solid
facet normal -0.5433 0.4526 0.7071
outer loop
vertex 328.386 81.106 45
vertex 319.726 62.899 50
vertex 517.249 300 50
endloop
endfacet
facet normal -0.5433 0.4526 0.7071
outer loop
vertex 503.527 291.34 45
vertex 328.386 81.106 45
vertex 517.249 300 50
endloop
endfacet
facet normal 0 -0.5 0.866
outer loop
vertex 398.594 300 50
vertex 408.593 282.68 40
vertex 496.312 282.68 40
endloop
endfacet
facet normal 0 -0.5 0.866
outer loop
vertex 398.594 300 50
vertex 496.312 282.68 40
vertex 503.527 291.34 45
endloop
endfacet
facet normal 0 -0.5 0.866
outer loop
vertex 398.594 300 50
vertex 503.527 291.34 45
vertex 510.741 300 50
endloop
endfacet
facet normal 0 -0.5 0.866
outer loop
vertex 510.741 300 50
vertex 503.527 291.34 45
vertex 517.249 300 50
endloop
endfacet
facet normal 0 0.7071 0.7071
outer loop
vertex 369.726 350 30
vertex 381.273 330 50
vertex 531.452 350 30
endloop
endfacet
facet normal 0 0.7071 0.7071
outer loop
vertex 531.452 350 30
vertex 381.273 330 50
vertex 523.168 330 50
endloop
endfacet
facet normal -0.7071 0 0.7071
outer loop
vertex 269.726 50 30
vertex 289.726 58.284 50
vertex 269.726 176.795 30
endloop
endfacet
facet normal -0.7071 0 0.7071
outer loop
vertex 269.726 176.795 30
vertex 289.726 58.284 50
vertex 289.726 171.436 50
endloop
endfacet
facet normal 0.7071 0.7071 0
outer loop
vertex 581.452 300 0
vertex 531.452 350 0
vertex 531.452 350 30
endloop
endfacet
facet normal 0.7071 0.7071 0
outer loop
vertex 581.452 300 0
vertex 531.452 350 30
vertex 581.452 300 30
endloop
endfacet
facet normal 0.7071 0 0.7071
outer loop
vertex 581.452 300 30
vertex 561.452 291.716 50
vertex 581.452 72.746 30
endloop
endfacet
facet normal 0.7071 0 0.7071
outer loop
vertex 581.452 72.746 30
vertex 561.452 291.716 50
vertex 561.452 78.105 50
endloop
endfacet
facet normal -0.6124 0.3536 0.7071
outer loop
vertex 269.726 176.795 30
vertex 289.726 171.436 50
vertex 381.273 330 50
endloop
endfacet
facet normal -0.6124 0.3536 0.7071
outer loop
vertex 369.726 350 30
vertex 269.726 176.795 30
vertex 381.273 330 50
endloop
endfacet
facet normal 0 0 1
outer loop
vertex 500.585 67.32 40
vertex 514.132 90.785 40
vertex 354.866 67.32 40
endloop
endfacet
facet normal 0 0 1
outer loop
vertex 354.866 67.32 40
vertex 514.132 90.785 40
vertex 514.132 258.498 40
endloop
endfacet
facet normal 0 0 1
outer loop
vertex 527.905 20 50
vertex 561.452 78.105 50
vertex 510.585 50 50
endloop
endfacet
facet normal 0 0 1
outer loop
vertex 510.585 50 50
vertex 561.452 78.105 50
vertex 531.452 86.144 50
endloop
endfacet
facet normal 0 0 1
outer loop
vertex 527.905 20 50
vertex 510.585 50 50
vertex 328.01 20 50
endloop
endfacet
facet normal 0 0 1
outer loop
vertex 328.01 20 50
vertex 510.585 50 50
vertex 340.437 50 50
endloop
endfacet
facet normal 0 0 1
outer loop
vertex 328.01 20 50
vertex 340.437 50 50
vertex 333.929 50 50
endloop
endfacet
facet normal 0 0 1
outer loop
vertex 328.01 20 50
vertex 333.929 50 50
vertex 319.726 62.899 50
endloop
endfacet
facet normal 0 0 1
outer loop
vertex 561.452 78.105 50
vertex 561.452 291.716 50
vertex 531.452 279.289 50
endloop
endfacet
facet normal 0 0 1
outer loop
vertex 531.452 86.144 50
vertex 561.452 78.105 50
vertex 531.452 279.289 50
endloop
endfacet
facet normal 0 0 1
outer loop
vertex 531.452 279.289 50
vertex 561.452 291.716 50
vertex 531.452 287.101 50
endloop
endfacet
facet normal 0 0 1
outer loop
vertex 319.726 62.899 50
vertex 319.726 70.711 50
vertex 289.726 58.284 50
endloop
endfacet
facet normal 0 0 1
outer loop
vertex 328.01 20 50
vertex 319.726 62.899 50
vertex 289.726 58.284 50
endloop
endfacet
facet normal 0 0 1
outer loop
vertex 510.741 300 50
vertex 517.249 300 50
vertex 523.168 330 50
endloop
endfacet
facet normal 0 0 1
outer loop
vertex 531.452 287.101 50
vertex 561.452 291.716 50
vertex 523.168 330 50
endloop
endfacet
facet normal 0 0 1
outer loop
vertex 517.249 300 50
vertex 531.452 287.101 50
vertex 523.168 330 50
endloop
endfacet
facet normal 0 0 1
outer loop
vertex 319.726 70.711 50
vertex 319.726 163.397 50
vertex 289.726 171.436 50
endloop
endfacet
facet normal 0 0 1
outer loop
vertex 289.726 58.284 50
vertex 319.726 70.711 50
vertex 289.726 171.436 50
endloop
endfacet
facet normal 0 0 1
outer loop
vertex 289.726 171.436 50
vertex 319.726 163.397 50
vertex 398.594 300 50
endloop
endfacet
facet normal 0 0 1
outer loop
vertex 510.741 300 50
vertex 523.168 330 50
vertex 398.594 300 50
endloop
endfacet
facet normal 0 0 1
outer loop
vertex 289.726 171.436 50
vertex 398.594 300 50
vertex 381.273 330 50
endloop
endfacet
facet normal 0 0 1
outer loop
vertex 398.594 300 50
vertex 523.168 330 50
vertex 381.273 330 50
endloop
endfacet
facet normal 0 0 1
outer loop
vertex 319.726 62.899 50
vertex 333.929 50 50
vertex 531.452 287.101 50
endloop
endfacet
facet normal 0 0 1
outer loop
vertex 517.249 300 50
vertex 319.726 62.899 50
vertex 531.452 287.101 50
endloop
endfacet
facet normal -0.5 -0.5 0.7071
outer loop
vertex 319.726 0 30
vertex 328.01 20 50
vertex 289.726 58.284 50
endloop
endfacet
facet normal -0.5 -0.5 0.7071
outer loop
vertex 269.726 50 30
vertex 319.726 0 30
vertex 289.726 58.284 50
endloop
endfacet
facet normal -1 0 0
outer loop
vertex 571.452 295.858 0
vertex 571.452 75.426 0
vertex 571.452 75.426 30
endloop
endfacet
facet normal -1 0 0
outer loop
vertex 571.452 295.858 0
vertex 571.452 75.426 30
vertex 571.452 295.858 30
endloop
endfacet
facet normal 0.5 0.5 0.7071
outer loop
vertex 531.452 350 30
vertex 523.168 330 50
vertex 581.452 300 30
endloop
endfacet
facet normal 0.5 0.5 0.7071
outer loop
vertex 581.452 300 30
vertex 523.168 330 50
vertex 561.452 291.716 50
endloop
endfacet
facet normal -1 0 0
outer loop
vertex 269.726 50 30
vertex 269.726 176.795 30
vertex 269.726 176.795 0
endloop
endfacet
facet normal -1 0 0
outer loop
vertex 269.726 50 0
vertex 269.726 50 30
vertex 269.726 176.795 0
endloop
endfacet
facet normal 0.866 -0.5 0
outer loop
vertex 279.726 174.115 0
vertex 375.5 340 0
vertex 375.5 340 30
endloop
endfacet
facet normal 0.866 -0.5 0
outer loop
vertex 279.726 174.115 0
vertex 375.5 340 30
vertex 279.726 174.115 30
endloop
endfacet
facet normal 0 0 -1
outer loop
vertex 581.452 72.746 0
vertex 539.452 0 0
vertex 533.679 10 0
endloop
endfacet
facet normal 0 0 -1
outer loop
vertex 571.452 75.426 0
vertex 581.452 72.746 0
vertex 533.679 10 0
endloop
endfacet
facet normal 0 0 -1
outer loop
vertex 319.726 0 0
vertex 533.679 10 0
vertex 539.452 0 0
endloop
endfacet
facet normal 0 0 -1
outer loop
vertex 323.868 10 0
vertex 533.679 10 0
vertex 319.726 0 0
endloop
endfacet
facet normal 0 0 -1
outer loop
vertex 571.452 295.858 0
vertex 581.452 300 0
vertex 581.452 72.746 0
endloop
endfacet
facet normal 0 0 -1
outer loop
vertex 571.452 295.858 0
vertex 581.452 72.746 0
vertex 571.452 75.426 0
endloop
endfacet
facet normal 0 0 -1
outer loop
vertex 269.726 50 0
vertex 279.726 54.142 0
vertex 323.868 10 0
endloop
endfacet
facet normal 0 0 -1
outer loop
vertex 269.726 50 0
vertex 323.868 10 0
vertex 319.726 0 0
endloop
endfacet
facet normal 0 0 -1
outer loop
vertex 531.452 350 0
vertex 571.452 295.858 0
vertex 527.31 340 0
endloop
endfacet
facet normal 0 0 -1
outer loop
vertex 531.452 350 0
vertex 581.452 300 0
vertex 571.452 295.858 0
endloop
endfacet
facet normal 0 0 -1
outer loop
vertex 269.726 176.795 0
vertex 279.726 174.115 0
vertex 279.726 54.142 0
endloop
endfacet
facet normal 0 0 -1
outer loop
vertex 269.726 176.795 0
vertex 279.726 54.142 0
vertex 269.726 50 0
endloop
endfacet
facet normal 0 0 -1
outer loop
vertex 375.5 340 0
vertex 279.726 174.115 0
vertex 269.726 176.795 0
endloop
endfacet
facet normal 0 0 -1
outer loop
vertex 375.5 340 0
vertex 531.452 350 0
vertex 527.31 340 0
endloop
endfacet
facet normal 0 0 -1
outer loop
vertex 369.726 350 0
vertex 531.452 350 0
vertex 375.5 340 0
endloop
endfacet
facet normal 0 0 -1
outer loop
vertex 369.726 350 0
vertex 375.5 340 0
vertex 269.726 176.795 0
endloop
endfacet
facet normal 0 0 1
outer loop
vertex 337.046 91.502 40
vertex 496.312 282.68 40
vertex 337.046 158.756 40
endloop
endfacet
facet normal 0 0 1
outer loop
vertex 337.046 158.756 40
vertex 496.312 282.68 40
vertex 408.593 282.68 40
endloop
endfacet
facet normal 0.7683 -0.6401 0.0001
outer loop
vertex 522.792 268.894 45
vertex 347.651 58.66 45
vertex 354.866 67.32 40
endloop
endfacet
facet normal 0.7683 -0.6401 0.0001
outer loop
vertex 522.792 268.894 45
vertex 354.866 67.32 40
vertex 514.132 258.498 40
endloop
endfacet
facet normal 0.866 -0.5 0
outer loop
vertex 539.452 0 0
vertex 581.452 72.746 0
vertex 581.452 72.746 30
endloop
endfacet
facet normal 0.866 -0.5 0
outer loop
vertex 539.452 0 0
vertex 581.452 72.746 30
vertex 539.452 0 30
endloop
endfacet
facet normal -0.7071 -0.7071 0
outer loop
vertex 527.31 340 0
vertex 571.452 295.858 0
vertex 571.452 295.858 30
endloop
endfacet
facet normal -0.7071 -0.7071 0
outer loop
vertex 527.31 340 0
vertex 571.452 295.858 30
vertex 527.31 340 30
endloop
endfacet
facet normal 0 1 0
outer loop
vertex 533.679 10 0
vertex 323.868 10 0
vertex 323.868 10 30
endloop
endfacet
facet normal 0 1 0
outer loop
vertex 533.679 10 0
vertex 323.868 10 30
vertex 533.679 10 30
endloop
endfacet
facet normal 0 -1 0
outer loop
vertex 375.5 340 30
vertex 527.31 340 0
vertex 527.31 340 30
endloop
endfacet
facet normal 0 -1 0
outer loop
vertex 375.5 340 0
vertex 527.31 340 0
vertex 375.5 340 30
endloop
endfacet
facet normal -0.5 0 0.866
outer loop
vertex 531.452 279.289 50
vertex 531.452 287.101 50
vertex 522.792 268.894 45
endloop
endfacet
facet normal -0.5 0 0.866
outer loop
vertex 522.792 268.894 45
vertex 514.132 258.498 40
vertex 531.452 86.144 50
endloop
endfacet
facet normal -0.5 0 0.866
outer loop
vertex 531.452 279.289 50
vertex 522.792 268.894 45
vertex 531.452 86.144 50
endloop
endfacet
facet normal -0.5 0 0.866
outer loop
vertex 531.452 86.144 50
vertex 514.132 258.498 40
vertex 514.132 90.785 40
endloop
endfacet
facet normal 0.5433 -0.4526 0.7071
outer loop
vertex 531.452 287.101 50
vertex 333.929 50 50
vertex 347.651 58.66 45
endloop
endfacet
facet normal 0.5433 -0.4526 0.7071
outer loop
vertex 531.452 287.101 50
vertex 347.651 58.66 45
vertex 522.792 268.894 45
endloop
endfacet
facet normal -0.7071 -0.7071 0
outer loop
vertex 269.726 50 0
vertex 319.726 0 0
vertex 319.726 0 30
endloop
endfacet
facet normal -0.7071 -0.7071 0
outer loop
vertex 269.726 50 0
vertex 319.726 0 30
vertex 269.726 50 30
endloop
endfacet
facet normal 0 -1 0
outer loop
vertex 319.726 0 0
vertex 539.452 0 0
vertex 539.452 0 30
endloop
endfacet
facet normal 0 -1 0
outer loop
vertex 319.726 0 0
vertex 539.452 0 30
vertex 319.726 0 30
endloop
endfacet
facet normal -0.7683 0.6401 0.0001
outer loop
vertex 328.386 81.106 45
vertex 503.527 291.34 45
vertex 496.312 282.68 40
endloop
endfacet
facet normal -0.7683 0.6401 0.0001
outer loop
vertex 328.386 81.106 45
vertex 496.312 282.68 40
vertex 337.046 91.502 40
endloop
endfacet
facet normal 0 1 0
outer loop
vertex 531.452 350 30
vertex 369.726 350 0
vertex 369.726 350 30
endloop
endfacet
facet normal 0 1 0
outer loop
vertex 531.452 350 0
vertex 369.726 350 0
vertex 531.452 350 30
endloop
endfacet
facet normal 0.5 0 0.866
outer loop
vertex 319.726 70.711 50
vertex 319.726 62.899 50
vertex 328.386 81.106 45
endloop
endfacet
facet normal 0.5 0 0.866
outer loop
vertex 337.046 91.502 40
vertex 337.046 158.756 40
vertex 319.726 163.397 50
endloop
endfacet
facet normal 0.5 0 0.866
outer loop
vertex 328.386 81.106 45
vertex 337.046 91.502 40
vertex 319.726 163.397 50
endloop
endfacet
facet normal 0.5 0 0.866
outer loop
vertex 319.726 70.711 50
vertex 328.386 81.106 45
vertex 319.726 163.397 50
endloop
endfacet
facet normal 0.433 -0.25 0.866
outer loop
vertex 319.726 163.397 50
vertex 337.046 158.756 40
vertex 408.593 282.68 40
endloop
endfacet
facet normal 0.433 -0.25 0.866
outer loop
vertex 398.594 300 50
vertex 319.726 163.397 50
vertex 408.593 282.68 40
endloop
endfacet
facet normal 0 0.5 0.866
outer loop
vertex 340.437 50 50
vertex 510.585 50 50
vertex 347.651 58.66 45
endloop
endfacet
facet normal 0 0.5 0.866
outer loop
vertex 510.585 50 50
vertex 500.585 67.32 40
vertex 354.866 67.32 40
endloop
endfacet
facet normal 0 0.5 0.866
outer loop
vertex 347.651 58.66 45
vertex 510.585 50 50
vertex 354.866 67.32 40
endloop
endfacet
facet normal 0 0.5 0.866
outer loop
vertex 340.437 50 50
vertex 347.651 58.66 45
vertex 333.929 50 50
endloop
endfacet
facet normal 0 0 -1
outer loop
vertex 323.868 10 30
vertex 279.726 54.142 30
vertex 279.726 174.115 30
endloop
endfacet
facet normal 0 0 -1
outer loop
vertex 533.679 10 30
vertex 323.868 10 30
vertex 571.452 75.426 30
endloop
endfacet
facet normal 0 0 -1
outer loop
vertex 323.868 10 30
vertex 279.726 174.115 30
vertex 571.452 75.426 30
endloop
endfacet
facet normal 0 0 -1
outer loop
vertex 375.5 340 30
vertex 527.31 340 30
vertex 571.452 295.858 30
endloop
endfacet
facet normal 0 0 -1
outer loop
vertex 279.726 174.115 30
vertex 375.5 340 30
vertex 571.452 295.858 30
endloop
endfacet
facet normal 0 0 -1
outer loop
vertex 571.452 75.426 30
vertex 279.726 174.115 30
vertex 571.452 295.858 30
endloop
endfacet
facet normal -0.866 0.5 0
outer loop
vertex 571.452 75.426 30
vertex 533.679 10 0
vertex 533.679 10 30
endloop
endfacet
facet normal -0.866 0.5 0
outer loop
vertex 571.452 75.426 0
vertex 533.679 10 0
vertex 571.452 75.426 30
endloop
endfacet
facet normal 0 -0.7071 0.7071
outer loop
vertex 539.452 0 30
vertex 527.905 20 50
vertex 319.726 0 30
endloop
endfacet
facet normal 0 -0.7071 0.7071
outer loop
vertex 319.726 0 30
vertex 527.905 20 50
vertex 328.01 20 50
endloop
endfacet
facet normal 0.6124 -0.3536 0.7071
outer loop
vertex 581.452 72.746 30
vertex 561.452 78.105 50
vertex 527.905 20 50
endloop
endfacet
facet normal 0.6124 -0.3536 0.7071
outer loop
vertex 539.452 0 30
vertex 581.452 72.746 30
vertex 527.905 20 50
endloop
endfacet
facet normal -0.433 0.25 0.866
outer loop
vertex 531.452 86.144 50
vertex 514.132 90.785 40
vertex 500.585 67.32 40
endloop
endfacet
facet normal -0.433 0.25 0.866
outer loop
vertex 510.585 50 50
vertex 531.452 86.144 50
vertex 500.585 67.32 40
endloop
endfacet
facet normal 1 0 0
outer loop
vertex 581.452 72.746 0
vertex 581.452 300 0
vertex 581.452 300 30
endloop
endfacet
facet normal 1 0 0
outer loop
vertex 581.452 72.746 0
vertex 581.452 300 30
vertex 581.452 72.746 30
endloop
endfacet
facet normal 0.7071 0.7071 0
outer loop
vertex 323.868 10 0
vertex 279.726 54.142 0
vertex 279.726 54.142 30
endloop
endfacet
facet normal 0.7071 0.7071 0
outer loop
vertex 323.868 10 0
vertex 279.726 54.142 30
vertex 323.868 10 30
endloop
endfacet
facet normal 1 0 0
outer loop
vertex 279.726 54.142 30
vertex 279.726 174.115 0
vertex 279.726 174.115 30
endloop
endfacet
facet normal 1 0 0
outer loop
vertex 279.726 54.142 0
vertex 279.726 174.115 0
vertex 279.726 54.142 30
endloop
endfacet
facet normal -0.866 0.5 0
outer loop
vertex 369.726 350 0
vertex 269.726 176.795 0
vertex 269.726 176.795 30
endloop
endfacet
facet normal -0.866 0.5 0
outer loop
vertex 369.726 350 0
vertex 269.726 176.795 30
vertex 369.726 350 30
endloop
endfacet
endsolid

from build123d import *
from OCP.BRepFilletAPI import BRepFilletAPI_MakeChamfer

# Parameters (mm, degrees)
BOSS_EXTRU_1_DEPTH      = 50
CHANFREIN1_SIZE         = 20
ENL_V_MAT_EXTRU_1_DEPTH = 10
CHANFREIN2_SIZE         = 10
CHANFREIN2_SIZE_2       = 17.320508076
CHANFREIN3_SIZE         = 5
ENL_V_MAT_EXTRU_2_DEPTH = 30
ESQUISSE4_W             = 311.726027397
ESQUISSE4_H             = 51.931996983
ENL_V_MAT_EXTRU_3_DEPTH = 681.504586336


# Some blends are built 0.0001 mm under size
with BuildPart() as part:
    # Esquisse1 → Boss.-Extru.1 (new body)
    with BuildSketch(Plane.XY):
        Polygon((0, 0), (219.726027397, 0), (269.726027397, 50), (269.726027397, 176.794919243), (169.726027397, 350), (8, 350), (-42, 300), (-42, 72.746133918), align=None)
    extrude(amount=BOSS_EXTRU_1_DEPTH)

    # Chanfrein1
    chanfrein1_edges = [part.edges().sort_by_distance(p)[0] for p in [
        (244.726027397, 25, 50),
        (269.726027397, 113.397459622, 50),
        (219.726027397, 263.397459622, 50),
        (88.863013699, 350, 50),
        (-17, 325, 50),
        (-42, 186.373066959, 50),
        (-21, 36.373066959, 50),
        (109.863013699, 0, 50),
    ]]
    chamfer(chanfrein1_edges, length=CHANFREIN1_SIZE)

    # Esquisse2 → Enlèv. mat.-Extru.1 (cut)
    with BuildSketch(Plane.XY.offset(50)):
        Polygon((28.710678119, 300), (219.726027397, 70.710678119), (219.726027397, 163.397459622), (140.858513938, 300), align=None)
        Polygon((199.015349279, 50), (8, 279.289321881), (8, 86.143593539), (28.867513459, 50), align=None)
    extrude(amount=-ENL_V_MAT_EXTRU_1_DEPTH, mode=Mode.SUBTRACT)

    # Chanfrein2
    chanfrein2_edges_1 = [part.edges().sort_by_distance(p)[0] for p in [
        (219.726027397, 117.05406887, 40),
    ]]
    chanfrein2_side_1 = [part.faces().sort_by_distance(p)[0] for p in [
        (219.726027397, 117.05406887, 40.2),
    ]]
    chanfrein2_edges_2 = [part.edges().sort_by_distance(p)[0] for p in [
        (180.292270668, 231.698729811, 40),
    ]]
    chanfrein2_side_2 = [part.faces().sort_by_distance(p)[0] for p in [
        (180.292270668, 231.698729811, 40.2),
    ]]
    chanfrein2_edges_3 = [part.edges().sort_by_distance(p)[0] for p in [
        (84.784596028, 300, 40),
    ]]
    chanfrein2_side_3 = [part.faces().sort_by_distance(p)[0] for p in [
        (84.784596028, 300, 40.2),
    ]]
    chanfrein2_edges_4 = [part.edges().sort_by_distance(p)[0] for p in [
        (113.941431369, 50, 40),
    ]]
    chanfrein2_side_4 = [part.faces().sort_by_distance(p)[0] for p in [
        (113.941431369, 50, 40.2),
    ]]
    chanfrein2_edges_5 = [part.edges().sort_by_distance(p)[0] for p in [
        (18.43375673, 68.07179677, 40),
    ]]
    chanfrein2_side_5 = [part.faces().sort_by_distance(p)[0] for p in [
        (18.43375673, 68.07179677, 40.2),
    ]]
    chanfrein2_edges_6 = [part.edges().sort_by_distance(p)[0] for p in [
        (8, 182.71645771, 40),
    ]]
    chanfrein2_side_6 = [part.faces().sort_by_distance(p)[0] for p in [
        (8, 182.71645771, 40.2),
    ]]
    chanfrein2 = BRepFilletAPI_MakeChamfer(part.part.solid().wrapped)
    for e in chanfrein2_edges_1:
        chanfrein2.Add(CHANFREIN2_SIZE - 0.0001, CHANFREIN2_SIZE_2 - 0.0001, e.wrapped, chanfrein2_side_1[0].wrapped)
    for e in chanfrein2_edges_2:
        chanfrein2.Add(CHANFREIN2_SIZE - 0.0001, CHANFREIN2_SIZE_2 - 0.0001, e.wrapped, chanfrein2_side_2[0].wrapped)
    for e in chanfrein2_edges_3:
        chanfrein2.Add(CHANFREIN2_SIZE - 0.0001, CHANFREIN2_SIZE_2 - 0.0001, e.wrapped, chanfrein2_side_3[0].wrapped)
    for e in chanfrein2_edges_4:
        chanfrein2.Add(CHANFREIN2_SIZE - 0.0001, CHANFREIN2_SIZE_2 - 0.0001, e.wrapped, chanfrein2_side_4[0].wrapped)
    for e in chanfrein2_edges_5:
        chanfrein2.Add(CHANFREIN2_SIZE - 0.0001, CHANFREIN2_SIZE_2 - 0.0001, e.wrapped, chanfrein2_side_5[0].wrapped)
    for e in chanfrein2_edges_6:
        chanfrein2.Add(CHANFREIN2_SIZE - 0.0001, CHANFREIN2_SIZE_2 - 0.0001, e.wrapped, chanfrein2_side_6[0].wrapped)
    add(Compound.cast(chanfrein2.Shape()), mode=Mode.REPLACE)  # a hair under: the kernel refuses the full size

    # Chanfrein3
    # the kernel refuses this chamfer: 5 mm, written as the material it takes off along each edge
    with BuildSketch(Plane(origin=(20.480424013, 309.879359904, 50), x_dir=(-0.768028153682994, -0.6398255480361086, 0.02749587661058626), z_dir=(0.6400675467511631, -0.7683186419682577, 0))) as chanfrein3_piece_1_section:
        Polygon((CHANFREIN3_SIZE * 0.999621916911, CHANFREIN3_SIZE * 0.0274958766106), (-CHANFREIN3_SIZE * 0.0274958766106, CHANFREIN3_SIZE * 0.999621916911), (0, 0), align=None)
    chanfrein3_piece_1 = extrude(amount=324.14681629, mode=Mode.PRIVATE)
    chanfrein3_piece_1 = split(chanfrein3_piece_1, bisect_by=Plane(origin=(122.894695162, 300, 48.383637618), z_dir=(0, -1, 0)), keep=Keep.TOP, mode=Mode.PRIVATE)
    chanfrein3_piece_1 = split(chanfrein3_piece_1, bisect_by=Plane(origin=(122.894695162, 212.546373523, -0.491261384), z_dir=(0, -0.4999984150451088, 0.8660263188566379)), keep=Keep.TOP, mode=Mode.PRIVATE)
    chanfrein3_piece_1 = split(chanfrein3_piece_1, bisect_by=Plane(origin=(219.726027397, 184.328556692, 48.383637618), z_dir=(-1, 0, 0)), keep=Keep.TOP, mode=Mode.PRIVATE)
    chanfrein3_piece_1 = split(chanfrein3_piece_1, bisect_by=Plane(origin=(146.402514085, 184.328556692, 7.666728775), z_dir=(-0.49999841504510817, 0, 0.8660263188566384)), keep=Keep.TOP, mode=Mode.PRIVATE)
    add(chanfrein3_piece_1, mode=Mode.SUBTRACT)
    with BuildSketch(Plane(origin=(207.245603384, 40.120640096, 50), x_dir=(-0.02112559457717319, -0.017599218287911274, -0.9996219169112968), z_dir=(-0.6400675467511632, 0.7683186419682577, 0))) as chanfrein3_piece_2_section:
        Polygon((CHANFREIN3_SIZE * 0.999621916911, -CHANFREIN3_SIZE * 0.0274958766106), (-CHANFREIN3_SIZE * 0.0274958766106, -CHANFREIN3_SIZE * 0.999621916911), (0, 0), align=None)
    chanfrein3_piece_2 = extrude(amount=324.14681629, mode=Mode.PRIVATE)
    chanfrein3_piece_2 = split(chanfrein3_piece_2, bisect_by=Plane(origin=(104.831332235, 50, 48.383637618), z_dir=(0, 1, 0)), keep=Keep.TOP, mode=Mode.PRIVATE)
    chanfrein3_piece_2 = split(chanfrein3_piece_2, bisect_by=Plane(origin=(104.831332235, 137.453626477, -0.491261384), z_dir=(0, 0.4999984150451082, 0.8660263188566383)), keep=Keep.TOP, mode=Mode.PRIVATE)
    chanfrein3_piece_2 = split(chanfrein3_piece_2, bisect_by=Plane(origin=(8, 165.671443308, 48.383637618), z_dir=(1, 0, 0)), keep=Keep.TOP, mode=Mode.PRIVATE)
    chanfrein3_piece_2 = split(chanfrein3_piece_2, bisect_by=Plane(origin=(81.323513312, 165.671443308, 7.666728775), z_dir=(0.49999841504510834, 0, 0.8660263188566383)), keep=Keep.TOP, mode=Mode.PRIVATE)
    add(chanfrein3_piece_2, mode=Mode.SUBTRACT)

    # Esquisse3 → Enlèv. mat.-Extru.2 (cut)
    with BuildSketch(Plane(origin=(0, 0, 0), x_dir=(-1, 0, 0), z_dir=(0, 0, -1))):
        Polygon((-5.773502692, 10), (32, 75.425625842), (32, 295.857864376), (-12.142135624, 340), (-163.952524705, 340), (-259.726027397, 174.115427319), (-259.726027397, 54.142135624), (-215.583891774, 10), align=None)
    extrude(amount=-ENL_V_MAT_EXTRU_2_DEPTH, mode=Mode.SUBTRACT)

    # Symétrie1: part across plane


with BuildPart() as part_1:
    add(part.part)
    add(part.part.mirror(Plane(origin=(269.726027397, 50, 50), x_dir=(0, 0, 1), z_dir=(-1, 0, 0))))

    # Esquisse4 → Enlèv. mat.-Extru.3 (cut, through all)
    with BuildSketch(Plane(origin=(0, 350, 0), x_dir=(1, 0, 0), z_dir=(0, 1, 0))):
        with Locations((113.863013698, -25.965998492)):
            Rectangle(ESQUISSE4_W, ESQUISSE4_H)
    extrude(amount=-ENL_V_MAT_EXTRU_3_DEPTH, mode=Mode.SUBTRACT)


solid = part_1.part
